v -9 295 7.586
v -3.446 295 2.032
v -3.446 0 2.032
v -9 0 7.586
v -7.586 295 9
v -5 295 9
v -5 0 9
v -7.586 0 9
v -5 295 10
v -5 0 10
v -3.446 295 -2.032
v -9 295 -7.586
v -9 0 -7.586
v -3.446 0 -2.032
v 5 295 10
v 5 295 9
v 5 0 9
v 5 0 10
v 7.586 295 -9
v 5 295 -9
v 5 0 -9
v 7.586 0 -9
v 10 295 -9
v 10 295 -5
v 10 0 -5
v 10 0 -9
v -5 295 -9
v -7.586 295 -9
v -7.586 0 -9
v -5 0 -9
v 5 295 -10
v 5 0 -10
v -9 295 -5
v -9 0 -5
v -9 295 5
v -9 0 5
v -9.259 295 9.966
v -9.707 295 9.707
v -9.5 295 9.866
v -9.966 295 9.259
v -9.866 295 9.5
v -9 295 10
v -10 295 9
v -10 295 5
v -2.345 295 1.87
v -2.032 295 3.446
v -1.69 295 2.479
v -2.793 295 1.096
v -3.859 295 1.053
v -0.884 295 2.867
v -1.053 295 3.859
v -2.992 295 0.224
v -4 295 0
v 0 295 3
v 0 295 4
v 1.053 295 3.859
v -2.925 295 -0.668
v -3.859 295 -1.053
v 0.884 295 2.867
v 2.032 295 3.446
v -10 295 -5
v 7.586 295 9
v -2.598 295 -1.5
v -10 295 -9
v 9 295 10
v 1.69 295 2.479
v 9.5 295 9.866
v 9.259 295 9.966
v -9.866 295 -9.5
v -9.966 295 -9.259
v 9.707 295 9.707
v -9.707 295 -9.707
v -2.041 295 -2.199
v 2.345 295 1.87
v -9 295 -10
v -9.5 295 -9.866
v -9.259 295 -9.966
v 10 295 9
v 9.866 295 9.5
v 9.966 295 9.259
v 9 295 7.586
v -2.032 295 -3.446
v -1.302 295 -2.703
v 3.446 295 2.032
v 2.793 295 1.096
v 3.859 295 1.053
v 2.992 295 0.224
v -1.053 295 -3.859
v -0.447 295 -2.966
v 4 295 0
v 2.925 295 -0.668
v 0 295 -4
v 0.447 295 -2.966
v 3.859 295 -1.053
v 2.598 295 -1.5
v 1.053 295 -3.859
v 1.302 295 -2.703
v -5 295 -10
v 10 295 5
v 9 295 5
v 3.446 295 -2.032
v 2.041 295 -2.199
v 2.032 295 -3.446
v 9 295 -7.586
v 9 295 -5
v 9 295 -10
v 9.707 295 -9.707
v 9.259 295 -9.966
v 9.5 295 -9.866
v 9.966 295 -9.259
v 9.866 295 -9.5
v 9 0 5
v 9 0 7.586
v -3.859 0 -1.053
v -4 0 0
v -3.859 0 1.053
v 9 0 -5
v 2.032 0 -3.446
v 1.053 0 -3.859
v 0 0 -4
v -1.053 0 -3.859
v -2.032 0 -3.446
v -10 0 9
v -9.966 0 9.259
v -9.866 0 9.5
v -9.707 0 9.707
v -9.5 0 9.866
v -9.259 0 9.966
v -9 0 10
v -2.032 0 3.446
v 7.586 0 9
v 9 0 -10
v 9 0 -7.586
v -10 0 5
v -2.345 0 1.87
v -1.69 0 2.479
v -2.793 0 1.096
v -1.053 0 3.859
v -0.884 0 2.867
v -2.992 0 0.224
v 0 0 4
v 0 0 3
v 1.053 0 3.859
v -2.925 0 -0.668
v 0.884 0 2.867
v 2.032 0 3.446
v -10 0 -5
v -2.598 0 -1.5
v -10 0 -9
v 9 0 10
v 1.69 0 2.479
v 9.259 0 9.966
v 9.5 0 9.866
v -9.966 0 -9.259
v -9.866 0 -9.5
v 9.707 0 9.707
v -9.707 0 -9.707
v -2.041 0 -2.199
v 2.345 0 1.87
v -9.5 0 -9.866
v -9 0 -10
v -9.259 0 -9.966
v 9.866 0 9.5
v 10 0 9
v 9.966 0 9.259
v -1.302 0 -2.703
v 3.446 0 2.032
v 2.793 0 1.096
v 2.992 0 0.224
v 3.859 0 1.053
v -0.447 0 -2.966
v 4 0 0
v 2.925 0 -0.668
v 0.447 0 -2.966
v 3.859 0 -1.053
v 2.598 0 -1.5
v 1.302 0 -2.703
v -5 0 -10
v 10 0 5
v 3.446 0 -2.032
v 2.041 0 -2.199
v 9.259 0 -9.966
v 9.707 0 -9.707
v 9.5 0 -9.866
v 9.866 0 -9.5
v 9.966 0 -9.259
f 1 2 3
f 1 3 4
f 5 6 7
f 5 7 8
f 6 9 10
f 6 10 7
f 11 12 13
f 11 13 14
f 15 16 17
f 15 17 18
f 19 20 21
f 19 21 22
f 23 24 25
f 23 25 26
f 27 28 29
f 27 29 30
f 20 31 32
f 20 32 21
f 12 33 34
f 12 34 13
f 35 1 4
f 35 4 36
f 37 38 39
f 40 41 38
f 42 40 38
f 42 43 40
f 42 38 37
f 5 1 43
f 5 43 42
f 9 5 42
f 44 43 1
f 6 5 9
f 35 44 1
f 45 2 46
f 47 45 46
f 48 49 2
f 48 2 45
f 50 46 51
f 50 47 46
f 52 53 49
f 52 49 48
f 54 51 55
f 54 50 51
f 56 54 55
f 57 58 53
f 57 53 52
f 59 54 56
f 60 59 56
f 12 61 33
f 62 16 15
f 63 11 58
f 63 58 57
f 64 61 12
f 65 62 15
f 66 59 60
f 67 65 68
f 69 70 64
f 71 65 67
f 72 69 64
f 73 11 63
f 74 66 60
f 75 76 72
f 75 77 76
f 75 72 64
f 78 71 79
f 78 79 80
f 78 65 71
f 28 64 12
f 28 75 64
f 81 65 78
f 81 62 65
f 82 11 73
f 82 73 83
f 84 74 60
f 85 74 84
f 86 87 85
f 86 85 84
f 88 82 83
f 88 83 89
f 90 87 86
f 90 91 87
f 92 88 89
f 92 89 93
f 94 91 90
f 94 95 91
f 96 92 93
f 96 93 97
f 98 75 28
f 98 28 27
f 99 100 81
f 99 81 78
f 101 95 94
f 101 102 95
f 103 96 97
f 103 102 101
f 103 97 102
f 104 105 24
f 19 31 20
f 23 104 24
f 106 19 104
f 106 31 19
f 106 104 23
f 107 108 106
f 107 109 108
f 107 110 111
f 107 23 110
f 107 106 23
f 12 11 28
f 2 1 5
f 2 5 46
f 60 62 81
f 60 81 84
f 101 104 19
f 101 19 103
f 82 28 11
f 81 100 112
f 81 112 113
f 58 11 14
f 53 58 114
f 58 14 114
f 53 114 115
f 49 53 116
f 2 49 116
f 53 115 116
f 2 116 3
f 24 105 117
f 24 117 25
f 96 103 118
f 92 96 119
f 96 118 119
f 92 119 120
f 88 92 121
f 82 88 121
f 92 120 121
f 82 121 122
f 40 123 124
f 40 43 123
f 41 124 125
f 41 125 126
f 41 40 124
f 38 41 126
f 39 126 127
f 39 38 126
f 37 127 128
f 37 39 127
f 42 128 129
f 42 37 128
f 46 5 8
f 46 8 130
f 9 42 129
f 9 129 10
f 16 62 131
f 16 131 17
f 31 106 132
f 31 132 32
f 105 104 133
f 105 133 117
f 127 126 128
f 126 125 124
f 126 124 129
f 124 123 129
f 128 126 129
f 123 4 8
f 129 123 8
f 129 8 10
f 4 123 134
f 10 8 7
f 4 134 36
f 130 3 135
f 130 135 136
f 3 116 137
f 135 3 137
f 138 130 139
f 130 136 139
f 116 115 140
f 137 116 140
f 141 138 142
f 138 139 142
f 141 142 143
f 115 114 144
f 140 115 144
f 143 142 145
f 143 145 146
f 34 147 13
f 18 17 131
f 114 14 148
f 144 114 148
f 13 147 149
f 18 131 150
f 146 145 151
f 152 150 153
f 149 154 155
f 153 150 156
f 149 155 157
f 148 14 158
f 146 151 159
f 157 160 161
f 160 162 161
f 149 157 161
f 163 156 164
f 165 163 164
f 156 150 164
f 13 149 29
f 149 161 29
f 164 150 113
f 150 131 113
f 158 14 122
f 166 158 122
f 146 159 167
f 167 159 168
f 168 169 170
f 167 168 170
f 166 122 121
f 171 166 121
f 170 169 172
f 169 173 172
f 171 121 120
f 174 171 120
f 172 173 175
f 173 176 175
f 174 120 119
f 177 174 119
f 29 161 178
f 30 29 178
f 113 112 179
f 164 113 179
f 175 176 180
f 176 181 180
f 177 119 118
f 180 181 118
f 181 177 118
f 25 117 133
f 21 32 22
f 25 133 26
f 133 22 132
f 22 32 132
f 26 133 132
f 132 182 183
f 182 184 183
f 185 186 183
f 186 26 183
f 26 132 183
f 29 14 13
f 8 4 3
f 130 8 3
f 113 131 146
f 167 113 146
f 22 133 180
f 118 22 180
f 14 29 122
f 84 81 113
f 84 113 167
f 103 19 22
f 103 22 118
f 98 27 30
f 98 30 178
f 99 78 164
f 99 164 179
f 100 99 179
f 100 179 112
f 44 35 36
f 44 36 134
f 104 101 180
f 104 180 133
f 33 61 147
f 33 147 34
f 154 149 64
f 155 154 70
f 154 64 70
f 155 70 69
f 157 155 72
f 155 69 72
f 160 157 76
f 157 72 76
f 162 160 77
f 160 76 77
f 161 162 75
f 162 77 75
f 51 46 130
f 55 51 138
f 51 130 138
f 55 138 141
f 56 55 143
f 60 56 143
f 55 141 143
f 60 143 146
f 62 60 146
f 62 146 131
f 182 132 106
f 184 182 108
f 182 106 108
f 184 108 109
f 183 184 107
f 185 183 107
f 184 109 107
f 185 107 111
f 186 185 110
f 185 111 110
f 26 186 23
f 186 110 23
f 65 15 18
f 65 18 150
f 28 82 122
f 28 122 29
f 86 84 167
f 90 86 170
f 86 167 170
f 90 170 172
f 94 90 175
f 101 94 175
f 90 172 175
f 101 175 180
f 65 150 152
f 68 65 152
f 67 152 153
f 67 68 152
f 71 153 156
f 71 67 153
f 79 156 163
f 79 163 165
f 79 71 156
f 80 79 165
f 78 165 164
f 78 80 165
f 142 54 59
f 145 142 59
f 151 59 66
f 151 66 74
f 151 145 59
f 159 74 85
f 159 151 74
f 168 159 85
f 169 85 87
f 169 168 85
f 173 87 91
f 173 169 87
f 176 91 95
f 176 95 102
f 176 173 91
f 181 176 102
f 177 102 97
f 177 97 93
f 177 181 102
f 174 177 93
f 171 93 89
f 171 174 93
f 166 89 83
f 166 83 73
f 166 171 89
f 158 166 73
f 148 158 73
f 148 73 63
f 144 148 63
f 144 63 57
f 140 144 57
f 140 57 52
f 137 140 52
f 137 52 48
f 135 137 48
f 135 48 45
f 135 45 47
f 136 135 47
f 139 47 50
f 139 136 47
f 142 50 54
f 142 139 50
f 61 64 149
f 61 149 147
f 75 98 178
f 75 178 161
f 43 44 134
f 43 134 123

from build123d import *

# Parameters (mm, degrees)
ESQUISSE1_R        = 3
BOSS_EXTRU_1_DEPTH = 295
CONG_1_R           = 1


with BuildPart() as part:
    # Esquisse1 → Boss.-Extru.1 (new body)
    with BuildSketch(Plane(origin=(0, 0, 0), x_dir=(1, 0, 0), z_dir=(0, 1, 0))):
        with BuildLine():
            Line((-9, 7.585786438), (-3.445719569, 2.031506006))
            ThreePointArc((-3.445719569, 2.031506006), (-4, 0), (-3.445719569, -2.031506006))
            Line((-3.445719569, -2.031506006), (-9, -7.585786438))
            Line((-9, -7.585786438), (-9, -5))
            Line((-9, -5), (-10, -5))
            Line((-10, -5), (-10, -10))
            Line((-10, -10), (-5, -10))
            Line((-5, -10), (-5, -9))
            Line((-5, -9), (-7.585786438, -9))
            Line((-7.585786438, -9), (-2.031506006, -3.445719569))
            ThreePointArc((-2.031506006, -3.445719569), (0, -4), (2.031506006, -3.445719569))
            Line((2.031506006, -3.445719569), (7.585786438, -9))
            Line((7.585786438, -9), (5, -9))
            Line((5, -9), (5, -10))
            Line((5, -10), (10, -10))
            Line((10, -10), (10, -5))
            Line((10, -5), (9, -5))
            Line((9, -5), (9, -7.585786438))
            Line((9, -7.585786438), (3.445719569, -2.031506006))
            ThreePointArc((3.445719569, -2.031506006), (4, 0), (3.445719569, 2.031506006))
            Line((3.445719569, 2.031506006), (9, 7.585786438))
            Line((9, 7.585786438), (9, 5))
            Line((9, 5), (10, 5))
            Line((10, 5), (10, 10))
            Line((10, 10), (5, 10))
            Line((5, 10), (5, 9))
            Line((5, 9), (7.585786438, 9))
            Line((7.585786438, 9), (2.031506006, 3.445719569))
            ThreePointArc((2.031506006, 3.445719569), (0, 4), (-2.031506006, 3.445719569))
            Line((-2.031506006, 3.445719569), (-7.585786438, 9))
            Line((-7.585786438, 9), (-5, 9))
            Line((-5, 9), (-5, 10))
            Line((-5, 10), (-10, 10))
            Line((-10, 10), (-10, 5))
            Line((-10, 5), (-9, 5))
            Line((-9, 5), (-9, 7.585786438))
        make_face()
        with Locations(Location((0, 0, 0), (0, 0, 270))):
            Circle(ESQUISSE1_R, mode=Mode.SUBTRACT)
    extrude(amount=BOSS_EXTRU_1_DEPTH)

    # Congé1
    cong_1_edges = [part.edges().sort_by_distance(p)[0] for p in [
        (-10, 147.5, -10),
        (10, 147.5, -10),
        (10, 147.5, 10),
        (-10, 147.5, 10),
    ]]
    fillet(cong_1_edges, radius=CONG_1_R)


solid = part.part
